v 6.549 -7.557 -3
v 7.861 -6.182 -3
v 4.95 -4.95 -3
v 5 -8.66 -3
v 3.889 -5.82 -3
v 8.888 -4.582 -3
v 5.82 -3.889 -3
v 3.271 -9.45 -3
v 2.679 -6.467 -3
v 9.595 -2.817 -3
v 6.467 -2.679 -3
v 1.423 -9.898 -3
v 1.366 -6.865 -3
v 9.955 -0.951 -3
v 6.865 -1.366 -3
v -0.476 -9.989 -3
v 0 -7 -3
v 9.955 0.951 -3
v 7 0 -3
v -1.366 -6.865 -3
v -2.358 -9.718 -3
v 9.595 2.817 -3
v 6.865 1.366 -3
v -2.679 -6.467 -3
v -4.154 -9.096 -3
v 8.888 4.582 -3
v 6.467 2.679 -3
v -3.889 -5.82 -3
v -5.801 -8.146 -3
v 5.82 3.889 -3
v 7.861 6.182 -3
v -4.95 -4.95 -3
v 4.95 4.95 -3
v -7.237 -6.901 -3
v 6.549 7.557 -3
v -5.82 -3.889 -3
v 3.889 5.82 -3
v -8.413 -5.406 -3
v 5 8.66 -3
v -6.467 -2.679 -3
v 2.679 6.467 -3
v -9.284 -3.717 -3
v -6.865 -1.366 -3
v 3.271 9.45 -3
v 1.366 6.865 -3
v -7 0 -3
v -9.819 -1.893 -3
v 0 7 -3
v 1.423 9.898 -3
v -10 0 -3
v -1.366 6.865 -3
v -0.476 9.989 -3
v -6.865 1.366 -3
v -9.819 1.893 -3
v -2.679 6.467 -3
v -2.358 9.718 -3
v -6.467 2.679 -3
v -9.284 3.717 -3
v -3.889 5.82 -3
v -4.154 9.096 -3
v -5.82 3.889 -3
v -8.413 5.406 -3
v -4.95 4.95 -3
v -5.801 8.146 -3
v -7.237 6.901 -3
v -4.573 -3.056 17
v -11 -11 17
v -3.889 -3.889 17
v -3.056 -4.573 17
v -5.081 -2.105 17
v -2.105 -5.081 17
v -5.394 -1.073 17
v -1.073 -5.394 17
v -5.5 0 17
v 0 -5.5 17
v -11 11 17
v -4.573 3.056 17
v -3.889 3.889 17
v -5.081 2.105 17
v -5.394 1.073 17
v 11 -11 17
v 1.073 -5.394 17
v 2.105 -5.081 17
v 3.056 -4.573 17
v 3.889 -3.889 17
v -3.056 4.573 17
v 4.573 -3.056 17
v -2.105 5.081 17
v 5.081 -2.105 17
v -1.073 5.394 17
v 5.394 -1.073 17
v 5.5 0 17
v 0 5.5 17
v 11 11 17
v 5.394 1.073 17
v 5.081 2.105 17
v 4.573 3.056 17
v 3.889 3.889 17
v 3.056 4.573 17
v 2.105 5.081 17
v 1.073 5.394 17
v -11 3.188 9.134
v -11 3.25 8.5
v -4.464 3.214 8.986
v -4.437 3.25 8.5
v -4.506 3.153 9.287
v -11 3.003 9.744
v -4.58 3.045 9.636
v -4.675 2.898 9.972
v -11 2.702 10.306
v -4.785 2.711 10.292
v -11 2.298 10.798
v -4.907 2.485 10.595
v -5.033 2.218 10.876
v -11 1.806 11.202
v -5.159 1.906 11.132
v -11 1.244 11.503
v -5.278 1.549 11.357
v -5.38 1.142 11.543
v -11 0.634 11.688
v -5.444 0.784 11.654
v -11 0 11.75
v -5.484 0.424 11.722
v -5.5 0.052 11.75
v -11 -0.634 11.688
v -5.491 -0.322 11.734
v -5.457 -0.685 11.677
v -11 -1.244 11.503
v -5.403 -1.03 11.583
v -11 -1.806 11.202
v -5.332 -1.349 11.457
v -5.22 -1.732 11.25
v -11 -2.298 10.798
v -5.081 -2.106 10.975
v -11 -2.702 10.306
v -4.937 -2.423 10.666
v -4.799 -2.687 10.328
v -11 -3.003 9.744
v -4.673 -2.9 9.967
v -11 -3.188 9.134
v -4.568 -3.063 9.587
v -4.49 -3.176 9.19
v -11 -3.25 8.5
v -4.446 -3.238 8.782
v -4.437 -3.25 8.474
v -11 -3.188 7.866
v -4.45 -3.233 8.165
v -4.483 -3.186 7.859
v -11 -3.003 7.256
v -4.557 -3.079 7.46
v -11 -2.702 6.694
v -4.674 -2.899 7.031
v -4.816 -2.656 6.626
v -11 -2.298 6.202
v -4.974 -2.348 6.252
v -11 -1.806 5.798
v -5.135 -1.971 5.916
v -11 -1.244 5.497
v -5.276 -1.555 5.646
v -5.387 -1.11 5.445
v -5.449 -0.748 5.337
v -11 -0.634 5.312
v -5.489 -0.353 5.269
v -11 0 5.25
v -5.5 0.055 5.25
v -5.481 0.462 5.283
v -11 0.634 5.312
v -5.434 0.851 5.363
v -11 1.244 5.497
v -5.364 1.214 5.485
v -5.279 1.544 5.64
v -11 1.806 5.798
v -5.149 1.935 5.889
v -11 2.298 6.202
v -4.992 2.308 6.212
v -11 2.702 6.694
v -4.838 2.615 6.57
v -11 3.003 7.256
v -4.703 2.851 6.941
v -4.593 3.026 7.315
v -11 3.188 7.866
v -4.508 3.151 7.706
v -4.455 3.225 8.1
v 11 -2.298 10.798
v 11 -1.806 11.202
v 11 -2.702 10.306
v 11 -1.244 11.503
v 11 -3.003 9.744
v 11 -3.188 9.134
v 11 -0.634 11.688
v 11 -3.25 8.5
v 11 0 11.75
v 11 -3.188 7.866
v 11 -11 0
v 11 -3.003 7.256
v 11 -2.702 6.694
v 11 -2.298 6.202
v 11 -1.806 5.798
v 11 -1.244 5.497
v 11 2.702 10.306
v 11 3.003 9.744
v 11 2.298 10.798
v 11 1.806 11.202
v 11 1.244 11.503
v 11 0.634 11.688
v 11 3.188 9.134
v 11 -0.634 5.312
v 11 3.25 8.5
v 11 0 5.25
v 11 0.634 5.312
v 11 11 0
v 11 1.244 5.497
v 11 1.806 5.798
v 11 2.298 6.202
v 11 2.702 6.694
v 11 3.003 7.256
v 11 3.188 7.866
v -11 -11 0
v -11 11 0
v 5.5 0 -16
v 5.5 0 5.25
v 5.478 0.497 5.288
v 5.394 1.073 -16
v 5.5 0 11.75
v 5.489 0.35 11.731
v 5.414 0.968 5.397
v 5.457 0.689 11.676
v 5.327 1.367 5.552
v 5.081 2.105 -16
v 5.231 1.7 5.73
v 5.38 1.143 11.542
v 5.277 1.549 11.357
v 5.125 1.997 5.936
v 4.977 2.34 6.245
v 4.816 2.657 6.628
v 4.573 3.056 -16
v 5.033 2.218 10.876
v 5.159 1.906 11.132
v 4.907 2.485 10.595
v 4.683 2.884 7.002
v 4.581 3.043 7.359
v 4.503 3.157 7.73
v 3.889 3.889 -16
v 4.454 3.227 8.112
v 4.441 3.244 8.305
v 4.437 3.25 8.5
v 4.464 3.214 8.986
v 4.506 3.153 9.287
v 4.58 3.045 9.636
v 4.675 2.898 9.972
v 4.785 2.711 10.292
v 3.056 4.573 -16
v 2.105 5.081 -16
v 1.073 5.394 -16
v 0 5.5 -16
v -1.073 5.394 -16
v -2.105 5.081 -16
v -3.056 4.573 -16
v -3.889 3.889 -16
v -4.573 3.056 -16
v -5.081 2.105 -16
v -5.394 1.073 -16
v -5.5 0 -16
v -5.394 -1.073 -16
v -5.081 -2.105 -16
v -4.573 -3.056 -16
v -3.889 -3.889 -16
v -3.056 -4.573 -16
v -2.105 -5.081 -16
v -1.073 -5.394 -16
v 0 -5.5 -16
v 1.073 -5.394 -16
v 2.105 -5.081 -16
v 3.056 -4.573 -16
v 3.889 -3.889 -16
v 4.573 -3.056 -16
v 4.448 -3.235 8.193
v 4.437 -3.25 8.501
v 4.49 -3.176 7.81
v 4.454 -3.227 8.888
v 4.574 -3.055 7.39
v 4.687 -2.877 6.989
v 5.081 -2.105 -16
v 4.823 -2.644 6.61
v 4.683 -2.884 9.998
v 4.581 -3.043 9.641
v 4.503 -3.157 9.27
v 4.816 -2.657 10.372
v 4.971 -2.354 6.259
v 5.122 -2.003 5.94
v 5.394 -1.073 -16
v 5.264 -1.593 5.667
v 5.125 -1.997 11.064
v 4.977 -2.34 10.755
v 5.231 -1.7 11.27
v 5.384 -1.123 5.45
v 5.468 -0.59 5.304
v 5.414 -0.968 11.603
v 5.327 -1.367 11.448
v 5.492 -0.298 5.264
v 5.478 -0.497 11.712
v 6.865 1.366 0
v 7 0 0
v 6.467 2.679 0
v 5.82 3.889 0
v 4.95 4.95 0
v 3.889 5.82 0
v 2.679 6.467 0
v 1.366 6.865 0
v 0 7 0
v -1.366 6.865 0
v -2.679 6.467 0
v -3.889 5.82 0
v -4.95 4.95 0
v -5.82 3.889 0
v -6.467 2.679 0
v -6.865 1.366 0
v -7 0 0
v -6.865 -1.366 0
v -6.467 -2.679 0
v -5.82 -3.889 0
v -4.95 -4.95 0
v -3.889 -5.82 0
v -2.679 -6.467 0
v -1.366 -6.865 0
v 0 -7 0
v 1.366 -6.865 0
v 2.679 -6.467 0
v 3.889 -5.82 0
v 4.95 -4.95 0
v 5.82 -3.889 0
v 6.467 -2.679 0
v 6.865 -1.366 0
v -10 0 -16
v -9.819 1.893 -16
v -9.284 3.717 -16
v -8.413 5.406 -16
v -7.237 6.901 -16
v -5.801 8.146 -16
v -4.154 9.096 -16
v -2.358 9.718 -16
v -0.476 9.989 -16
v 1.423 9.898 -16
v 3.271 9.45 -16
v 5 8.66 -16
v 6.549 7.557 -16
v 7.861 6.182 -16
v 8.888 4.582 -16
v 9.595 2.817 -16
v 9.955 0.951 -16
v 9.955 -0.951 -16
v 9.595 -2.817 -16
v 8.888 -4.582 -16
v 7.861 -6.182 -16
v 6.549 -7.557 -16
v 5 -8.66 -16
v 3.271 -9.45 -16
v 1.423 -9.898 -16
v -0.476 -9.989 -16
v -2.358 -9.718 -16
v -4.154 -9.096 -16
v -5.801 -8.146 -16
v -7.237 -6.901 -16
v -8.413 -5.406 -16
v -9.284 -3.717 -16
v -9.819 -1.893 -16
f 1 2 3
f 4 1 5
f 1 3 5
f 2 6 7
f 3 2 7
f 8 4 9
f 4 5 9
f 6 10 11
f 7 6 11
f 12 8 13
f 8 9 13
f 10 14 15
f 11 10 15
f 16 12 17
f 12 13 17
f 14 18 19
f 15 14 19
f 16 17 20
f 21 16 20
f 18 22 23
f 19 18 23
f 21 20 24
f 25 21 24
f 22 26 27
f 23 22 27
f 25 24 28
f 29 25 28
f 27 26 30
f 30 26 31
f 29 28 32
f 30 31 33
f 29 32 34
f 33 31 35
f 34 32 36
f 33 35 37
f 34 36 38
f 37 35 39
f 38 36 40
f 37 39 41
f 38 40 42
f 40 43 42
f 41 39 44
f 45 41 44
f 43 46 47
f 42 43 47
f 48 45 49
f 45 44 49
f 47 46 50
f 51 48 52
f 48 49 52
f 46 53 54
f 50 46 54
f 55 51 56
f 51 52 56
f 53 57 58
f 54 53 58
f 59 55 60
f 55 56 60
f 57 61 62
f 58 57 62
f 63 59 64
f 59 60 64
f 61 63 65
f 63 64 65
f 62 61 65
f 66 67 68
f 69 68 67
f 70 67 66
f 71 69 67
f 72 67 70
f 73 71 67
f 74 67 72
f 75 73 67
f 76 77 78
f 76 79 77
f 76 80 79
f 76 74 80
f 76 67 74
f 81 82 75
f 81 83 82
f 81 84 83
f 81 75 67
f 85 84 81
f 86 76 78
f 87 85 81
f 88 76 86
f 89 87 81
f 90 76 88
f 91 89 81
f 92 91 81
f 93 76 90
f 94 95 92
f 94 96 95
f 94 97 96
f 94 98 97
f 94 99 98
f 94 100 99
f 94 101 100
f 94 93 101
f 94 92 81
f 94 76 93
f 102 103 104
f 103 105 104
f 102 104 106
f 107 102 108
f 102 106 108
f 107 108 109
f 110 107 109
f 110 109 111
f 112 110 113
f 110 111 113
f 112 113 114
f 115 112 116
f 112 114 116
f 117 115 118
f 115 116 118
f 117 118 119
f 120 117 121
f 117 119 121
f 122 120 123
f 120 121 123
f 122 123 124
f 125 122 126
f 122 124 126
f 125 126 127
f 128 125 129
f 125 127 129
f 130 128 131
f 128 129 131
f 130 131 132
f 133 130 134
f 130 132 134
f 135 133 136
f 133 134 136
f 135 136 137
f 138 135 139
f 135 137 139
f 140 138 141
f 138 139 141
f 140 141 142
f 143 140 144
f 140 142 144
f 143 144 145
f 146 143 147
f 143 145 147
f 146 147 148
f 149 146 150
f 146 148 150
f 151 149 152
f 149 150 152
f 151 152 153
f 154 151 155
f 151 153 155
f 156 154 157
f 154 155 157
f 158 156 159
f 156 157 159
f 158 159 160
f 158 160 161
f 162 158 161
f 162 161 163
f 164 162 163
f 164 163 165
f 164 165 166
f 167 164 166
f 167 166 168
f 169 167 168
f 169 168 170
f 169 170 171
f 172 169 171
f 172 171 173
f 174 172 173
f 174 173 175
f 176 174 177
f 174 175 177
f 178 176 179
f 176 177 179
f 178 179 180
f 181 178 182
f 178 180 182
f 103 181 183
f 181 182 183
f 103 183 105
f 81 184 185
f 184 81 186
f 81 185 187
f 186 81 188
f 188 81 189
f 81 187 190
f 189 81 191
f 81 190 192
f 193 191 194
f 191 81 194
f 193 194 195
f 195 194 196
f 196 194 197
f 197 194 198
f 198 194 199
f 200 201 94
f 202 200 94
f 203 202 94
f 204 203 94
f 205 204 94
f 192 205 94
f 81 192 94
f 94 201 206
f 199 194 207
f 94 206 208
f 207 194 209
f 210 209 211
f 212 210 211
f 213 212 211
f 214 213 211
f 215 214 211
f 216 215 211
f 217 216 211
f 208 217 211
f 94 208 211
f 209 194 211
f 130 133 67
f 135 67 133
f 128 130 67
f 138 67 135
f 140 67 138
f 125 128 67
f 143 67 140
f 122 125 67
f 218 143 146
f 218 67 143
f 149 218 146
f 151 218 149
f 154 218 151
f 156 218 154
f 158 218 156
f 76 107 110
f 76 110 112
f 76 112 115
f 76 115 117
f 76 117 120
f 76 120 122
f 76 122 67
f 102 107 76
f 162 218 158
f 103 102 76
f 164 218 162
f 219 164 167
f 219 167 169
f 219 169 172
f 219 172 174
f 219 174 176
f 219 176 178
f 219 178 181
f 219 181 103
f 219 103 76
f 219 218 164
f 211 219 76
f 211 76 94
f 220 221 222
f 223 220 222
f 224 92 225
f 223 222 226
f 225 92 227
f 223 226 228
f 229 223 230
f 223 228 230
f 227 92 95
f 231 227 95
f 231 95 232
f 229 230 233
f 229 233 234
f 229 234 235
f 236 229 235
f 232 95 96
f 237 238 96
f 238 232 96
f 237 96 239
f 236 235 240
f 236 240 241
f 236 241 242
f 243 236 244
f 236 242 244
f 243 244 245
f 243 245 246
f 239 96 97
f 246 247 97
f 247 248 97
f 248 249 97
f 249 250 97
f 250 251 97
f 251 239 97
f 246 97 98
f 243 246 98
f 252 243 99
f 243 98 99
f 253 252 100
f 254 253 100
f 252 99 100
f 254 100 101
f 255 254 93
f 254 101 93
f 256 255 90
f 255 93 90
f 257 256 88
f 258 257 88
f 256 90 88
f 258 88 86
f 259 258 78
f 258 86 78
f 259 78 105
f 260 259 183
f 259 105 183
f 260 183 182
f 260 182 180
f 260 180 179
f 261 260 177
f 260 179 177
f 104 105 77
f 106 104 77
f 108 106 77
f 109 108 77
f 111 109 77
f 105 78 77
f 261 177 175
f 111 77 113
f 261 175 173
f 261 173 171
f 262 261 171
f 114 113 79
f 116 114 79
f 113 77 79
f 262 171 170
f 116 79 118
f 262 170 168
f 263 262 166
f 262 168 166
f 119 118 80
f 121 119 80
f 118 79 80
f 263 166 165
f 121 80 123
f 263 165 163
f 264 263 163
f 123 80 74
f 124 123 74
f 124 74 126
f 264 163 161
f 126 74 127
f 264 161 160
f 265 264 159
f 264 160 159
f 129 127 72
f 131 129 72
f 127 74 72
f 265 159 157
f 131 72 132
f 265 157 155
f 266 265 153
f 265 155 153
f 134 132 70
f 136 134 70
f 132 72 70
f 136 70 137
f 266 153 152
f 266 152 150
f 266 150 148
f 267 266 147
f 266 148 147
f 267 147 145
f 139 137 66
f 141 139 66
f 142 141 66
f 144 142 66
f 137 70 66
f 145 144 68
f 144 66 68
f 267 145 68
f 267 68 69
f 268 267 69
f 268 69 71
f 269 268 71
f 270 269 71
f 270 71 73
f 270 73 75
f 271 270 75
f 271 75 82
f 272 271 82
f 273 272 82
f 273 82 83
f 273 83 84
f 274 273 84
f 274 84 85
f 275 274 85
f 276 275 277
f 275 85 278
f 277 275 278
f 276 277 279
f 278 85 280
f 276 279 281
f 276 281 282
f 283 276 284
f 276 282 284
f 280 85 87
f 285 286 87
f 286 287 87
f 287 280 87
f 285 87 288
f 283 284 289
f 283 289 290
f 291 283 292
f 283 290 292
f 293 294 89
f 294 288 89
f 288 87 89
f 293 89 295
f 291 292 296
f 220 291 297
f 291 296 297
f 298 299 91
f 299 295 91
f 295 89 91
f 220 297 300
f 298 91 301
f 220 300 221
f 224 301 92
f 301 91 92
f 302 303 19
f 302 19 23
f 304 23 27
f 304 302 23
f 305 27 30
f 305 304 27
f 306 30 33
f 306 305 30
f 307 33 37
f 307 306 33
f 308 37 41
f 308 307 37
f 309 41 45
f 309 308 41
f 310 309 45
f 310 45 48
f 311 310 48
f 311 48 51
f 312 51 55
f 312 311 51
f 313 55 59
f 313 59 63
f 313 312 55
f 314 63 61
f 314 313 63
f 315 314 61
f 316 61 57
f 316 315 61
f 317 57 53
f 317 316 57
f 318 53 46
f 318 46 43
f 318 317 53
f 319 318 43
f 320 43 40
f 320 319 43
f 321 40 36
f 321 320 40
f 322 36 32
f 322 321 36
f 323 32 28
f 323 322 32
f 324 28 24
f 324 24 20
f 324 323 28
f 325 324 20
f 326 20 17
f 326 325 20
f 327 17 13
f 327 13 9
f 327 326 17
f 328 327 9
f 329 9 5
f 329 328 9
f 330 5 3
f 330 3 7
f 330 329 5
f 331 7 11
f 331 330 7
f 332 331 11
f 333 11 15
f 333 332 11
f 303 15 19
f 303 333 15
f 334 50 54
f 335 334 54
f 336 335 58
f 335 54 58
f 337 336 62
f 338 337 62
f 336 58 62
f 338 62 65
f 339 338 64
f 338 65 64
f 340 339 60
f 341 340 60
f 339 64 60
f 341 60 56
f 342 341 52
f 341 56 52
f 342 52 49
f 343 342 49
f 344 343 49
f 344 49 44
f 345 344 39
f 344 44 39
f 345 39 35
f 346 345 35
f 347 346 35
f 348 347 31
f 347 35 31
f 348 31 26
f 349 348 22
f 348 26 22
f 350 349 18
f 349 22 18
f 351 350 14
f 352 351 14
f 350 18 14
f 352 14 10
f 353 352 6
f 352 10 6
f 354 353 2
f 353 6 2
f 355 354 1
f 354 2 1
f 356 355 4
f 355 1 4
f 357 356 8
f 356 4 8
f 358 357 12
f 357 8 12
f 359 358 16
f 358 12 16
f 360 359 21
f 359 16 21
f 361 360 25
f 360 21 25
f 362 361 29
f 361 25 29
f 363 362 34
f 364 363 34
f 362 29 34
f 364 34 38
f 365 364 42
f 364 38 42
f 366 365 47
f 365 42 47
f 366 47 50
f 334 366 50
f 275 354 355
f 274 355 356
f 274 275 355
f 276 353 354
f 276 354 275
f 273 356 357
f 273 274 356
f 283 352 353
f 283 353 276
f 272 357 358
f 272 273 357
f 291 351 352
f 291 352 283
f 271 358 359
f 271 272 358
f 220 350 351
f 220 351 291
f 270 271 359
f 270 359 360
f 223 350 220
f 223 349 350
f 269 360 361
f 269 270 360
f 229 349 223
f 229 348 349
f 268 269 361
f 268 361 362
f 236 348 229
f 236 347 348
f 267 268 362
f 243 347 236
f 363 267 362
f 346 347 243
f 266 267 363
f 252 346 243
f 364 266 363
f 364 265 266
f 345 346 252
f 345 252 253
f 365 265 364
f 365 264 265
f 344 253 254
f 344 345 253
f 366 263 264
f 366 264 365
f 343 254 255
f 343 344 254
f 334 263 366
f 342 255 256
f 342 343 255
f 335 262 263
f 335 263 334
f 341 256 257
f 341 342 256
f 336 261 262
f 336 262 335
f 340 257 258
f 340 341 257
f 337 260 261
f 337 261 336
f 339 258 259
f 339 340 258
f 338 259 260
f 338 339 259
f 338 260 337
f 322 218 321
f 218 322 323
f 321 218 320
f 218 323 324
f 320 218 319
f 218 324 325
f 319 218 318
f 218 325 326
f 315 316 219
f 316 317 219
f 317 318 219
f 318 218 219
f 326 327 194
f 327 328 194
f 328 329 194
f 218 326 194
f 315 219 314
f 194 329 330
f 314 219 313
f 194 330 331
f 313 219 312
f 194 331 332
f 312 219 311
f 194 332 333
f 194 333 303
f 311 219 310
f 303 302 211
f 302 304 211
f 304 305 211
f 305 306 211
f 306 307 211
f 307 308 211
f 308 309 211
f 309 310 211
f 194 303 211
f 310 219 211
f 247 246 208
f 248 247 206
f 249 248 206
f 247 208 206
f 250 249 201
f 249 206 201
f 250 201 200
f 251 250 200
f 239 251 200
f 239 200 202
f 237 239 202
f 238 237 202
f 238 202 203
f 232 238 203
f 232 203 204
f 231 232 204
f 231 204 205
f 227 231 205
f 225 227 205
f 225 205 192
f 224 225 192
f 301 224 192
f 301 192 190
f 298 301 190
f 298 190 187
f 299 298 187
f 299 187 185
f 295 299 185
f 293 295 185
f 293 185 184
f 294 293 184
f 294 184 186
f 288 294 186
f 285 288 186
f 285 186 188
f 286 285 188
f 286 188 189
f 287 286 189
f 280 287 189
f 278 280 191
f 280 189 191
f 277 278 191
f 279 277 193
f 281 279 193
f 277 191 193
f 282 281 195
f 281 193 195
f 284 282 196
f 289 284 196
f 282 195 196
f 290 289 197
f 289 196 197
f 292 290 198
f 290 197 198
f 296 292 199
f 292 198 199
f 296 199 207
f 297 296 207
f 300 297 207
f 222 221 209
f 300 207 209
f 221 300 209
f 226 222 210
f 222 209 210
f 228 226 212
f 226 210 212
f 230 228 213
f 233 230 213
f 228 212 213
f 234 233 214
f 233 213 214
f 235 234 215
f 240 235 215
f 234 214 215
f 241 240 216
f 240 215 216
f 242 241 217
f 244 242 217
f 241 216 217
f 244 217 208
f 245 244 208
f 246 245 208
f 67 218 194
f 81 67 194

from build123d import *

# Parameters (mm, degrees)
SKETCH1_W           = 22
SKETCH1_H           = 22
BOSS_EXTRUDE1_DEPTH = 17
SKETCH5_R           = 7
BOSS_EXTRUDE4_DEPTH = 3
SKETCH6_R           = 10
BOSS_EXTRUDE5_DEPTH = 13
SKETCH7_R           = 5.5
CUT_EXTRUDE1_DEPTH  = 37.482872694
SKETCH8_R           = 3.25
CUT_EXTRUDE2_DEPTH  = 46.5


with BuildPart() as part:
    # Sketch1 → Boss-Extrude1 (new body)
    with BuildSketch(Plane.XY):
        Rectangle(SKETCH1_W, SKETCH1_H)
    extrude(amount=BOSS_EXTRUDE1_DEPTH)

    # Sketch5 → Boss-Extrude4 (add)
    with BuildSketch(Plane.XY):
        Circle(SKETCH5_R)
    extrude(amount=-BOSS_EXTRUDE4_DEPTH)

    # Sketch6 → Boss-Extrude5 (add)
    with BuildSketch(Plane(origin=(0, 0, -3), x_dir=(-1, 0, 0), z_dir=(0, 0, -1))):
        Circle(SKETCH6_R)
    extrude(amount=BOSS_EXTRUDE5_DEPTH)

    # Sketch7 → Cut-Extrude1 (cut, through all)
    with BuildSketch(Plane.XY.offset(17)):
        Circle(SKETCH7_R)
    extrude(amount=-CUT_EXTRUDE1_DEPTH, mode=Mode.SUBTRACT)

    # Sketch8 → Cut-Extrude2 (cut, symmetric)
    with BuildSketch(Plane(origin=(11, 0, 0), x_dir=(0, 0, -1), z_dir=(1, 0, 0))):
        with Locations(Location((-8.5, 0, 0), (0, 0, 90))):
            Circle(SKETCH8_R)
    extrude(amount=CUT_EXTRUDE2_DEPTH, both=True, mode=Mode.SUBTRACT)


solid = part.part
